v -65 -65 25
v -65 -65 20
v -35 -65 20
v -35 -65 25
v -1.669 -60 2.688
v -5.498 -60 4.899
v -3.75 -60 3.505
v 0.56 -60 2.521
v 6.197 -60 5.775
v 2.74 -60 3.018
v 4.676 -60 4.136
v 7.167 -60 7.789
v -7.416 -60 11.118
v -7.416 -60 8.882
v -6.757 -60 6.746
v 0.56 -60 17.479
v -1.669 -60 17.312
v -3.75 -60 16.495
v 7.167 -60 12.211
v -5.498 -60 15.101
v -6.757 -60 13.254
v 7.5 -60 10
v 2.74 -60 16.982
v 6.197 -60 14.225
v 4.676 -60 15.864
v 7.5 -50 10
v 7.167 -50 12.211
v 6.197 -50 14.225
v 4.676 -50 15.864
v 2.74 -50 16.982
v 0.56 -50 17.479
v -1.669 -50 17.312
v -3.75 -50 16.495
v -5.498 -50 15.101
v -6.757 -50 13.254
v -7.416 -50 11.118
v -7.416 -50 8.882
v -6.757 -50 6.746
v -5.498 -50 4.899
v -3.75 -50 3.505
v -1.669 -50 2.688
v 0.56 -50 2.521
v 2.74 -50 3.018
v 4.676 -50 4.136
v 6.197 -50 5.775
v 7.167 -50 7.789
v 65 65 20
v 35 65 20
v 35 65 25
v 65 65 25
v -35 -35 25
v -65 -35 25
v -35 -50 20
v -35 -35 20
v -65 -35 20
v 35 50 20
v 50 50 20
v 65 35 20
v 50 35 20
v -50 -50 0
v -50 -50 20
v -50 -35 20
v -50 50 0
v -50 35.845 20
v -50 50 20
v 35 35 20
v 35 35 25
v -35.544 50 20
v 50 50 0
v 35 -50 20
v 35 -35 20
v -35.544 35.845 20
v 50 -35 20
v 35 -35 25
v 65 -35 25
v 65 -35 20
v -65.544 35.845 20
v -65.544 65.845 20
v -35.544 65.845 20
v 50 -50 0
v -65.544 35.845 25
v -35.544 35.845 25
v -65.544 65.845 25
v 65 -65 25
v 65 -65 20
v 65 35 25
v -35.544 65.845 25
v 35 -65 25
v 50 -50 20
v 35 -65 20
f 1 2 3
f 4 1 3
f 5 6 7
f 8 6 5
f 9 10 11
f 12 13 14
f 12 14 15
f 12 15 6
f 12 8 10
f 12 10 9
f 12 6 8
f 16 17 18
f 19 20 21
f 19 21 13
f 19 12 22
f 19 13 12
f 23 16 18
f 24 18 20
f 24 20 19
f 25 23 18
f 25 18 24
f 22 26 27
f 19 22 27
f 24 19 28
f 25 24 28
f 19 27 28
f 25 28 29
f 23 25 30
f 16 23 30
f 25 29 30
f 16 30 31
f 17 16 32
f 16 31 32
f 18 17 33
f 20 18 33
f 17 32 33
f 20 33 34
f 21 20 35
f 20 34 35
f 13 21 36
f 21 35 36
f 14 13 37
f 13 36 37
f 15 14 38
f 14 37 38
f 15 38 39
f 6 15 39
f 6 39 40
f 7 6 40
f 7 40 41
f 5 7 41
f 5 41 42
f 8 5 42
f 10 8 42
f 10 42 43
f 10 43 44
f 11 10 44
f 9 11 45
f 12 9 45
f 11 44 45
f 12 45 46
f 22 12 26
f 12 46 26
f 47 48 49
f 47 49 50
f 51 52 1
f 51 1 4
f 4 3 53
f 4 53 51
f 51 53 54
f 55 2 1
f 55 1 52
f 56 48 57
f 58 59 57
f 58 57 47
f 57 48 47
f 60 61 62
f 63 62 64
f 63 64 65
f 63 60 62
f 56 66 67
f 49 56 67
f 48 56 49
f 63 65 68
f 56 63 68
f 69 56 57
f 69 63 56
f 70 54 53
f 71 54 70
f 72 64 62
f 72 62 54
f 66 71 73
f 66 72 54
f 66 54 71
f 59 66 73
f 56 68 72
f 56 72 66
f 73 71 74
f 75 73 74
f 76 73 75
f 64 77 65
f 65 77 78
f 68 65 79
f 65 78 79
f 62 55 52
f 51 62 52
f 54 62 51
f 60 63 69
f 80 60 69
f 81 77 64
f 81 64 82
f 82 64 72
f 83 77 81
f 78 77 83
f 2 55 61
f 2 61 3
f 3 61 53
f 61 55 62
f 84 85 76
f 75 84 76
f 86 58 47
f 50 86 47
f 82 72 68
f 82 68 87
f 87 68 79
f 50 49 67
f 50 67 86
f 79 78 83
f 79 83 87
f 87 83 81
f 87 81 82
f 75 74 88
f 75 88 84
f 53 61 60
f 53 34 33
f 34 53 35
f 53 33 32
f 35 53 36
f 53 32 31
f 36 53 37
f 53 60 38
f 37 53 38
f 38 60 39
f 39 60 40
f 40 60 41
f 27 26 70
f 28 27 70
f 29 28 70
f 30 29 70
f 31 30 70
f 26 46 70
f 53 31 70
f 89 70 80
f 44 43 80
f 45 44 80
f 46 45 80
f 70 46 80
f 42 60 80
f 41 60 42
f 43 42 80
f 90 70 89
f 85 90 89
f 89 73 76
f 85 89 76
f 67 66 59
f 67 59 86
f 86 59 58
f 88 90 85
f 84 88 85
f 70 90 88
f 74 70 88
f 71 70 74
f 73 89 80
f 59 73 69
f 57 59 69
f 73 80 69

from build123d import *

# Parameters (mm, degrees)
SKETCH_W     = 100
SKETCH_H     = 100
PAD_DEPTH    = 20
SKETCH001_W  = 30
SKETCH001_H  = 30
PAD001_DEPTH = 5
SKETCH002_R  = 7.5
PAD002_DEPTH = 10


with BuildPart() as part:
    # Sketch → Pad (new body)
    with BuildSketch(Plane.XY):
        Rectangle(SKETCH_W, SKETCH_H)
    extrude(amount=PAD_DEPTH)

    # Sketch001 (on Face6 of Pad) → Pad001 (join)
    with BuildSketch(Plane.XY.offset(20)):
        with Locations((-50.543835, 50.845081)):
            Rectangle(SKETCH001_W, SKETCH001_H)
        with Locations((-50, -50)):
            Rectangle(SKETCH001_W, SKETCH001_H)
        with Locations((50, -50)):
            Rectangle(SKETCH001_W, SKETCH001_H)
        with Locations((50, 50)):
            Rectangle(SKETCH001_W, SKETCH001_H)
    extrude(amount=PAD001_DEPTH)

    # Sketch002 (on Face1 of Pad001) → Pad002 (join)
    with BuildSketch(Plane.XZ.offset(50)):
        with Locations((0, 10)):
            Circle(SKETCH002_R)
    extrude(amount=PAD002_DEPTH)


solid = part.part
